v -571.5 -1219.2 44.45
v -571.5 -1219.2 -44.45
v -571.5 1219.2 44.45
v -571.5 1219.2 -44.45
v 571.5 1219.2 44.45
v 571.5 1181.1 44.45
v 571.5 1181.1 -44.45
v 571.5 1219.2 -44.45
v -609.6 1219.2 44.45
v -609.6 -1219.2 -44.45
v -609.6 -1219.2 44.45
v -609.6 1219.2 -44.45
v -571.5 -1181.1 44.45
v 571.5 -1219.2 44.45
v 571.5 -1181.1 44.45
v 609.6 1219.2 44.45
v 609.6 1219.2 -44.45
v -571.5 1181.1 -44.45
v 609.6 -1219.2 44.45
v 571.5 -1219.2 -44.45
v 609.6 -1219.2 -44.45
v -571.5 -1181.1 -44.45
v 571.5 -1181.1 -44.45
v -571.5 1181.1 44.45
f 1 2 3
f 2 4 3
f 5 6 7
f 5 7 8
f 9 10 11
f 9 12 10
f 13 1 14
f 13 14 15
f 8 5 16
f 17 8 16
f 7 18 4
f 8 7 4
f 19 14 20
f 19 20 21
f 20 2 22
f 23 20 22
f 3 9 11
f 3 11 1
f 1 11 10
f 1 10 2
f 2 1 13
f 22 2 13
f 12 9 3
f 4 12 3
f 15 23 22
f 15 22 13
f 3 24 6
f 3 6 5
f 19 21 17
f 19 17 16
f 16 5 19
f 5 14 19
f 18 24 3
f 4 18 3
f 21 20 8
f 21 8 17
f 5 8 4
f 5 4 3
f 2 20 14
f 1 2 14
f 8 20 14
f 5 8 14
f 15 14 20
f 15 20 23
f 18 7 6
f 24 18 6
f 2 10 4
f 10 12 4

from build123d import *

# Parameters (mm, degrees)
F0_W     = 38.1
F0_H     = 88.9
F1_DEPTH = 1219.2
F2_W     = 38.1
F2_H     = 88.9
F3_DEPTH = 1143


with BuildPart() as f1:
    # F0 (on Front) → F1 (new body, symmetric)
    with BuildSketch(Plane.XZ):
        with Locations((-590.55, 0)):
            Rectangle(F0_W, F0_H)
        with Locations((590.55, 0)):
            Rectangle(F0_W, F0_H)
    extrude(amount=F1_DEPTH, both=True)


with BuildPart() as f3:
    # F2 (on face) → F3 (new body)
    with BuildSketch(Plane.YZ.offset(-571.5)):
        with Locations((-1200.15, 0)):
            Rectangle(F2_W, F2_H)
        with Locations((1200.15, 0)):
            Rectangle(F2_W, F2_H)
    extrude(amount=F3_DEPTH)


solid = Compound([f1.part, f3.part])
